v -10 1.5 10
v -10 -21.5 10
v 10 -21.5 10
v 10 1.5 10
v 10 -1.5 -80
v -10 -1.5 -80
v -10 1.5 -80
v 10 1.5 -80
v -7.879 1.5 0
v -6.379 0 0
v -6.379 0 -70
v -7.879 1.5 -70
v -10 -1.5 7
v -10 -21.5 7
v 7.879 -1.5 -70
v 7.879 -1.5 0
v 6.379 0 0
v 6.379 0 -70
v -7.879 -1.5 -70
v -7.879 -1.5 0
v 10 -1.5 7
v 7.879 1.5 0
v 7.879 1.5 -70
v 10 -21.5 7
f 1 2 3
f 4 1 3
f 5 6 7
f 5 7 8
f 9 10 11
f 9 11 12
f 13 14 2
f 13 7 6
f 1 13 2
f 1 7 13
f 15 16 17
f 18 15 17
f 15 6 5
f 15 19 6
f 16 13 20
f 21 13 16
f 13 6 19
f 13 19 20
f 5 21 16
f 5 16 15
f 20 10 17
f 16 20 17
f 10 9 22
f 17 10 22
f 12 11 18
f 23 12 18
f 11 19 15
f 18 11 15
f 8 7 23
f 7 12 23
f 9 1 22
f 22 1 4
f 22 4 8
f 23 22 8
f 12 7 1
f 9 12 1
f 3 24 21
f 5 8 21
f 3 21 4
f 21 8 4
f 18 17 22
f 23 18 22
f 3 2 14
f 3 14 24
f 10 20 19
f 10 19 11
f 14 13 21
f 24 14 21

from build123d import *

# Parameters (mm, degrees)
SKETCH_W     = 20
SKETCH_H     = 3
PAD_DEPTH    = 10
PAD001_DEPTH = 70
SKETCH002_W  = 20
SKETCH002_H  = 3
PAD002_DEPTH = 10
SKETCH006_W  = 20
SKETCH006_H  = 3
PAD004_DEPTH = 20


with BuildPart() as part:
    # Sketch (on XY_Plane of Origin) → Pad (new body)
    with BuildSketch(Plane.XY):
        Rectangle(SKETCH_W, SKETCH_H)
    extrude(amount=PAD_DEPTH)

    # Sketch001 (on Face5 of Pad) → Pad001 (join)
    with BuildSketch(Plane(origin=(0, 0, 0), x_dir=(1, 0, 0), z_dir=(0, 0, -1))):
        Polygon((-7.87868, 1.5), (-6.37868, 0), (-7.87868, -1.5), (-10, -1.5), (-10, 1.5), align=None)
        Polygon((7.87868, 1.5), (6.37868, 0), (7.87868, -1.5), (10, -1.5), (10, 1.5), align=None)
    extrude(amount=PAD001_DEPTH)

    # Sketch002 (on Face7 of Pad001) → Pad002 (join)
    with BuildSketch(Plane(origin=(0, 0, -70), x_dir=(1, 0, 0), z_dir=(0, 0, -1))):
        Rectangle(SKETCH002_W, SKETCH002_H)
    extrude(amount=PAD002_DEPTH)

    # Sketch006 (on Face10 of Pad002) → Pad004 (join)
    with BuildSketch(Plane.XZ.offset(1.5)):
        with Locations((0, 8.5)):
            Rectangle(SKETCH006_W, SKETCH006_H)
    extrude(amount=PAD004_DEPTH)


solid = part.part
